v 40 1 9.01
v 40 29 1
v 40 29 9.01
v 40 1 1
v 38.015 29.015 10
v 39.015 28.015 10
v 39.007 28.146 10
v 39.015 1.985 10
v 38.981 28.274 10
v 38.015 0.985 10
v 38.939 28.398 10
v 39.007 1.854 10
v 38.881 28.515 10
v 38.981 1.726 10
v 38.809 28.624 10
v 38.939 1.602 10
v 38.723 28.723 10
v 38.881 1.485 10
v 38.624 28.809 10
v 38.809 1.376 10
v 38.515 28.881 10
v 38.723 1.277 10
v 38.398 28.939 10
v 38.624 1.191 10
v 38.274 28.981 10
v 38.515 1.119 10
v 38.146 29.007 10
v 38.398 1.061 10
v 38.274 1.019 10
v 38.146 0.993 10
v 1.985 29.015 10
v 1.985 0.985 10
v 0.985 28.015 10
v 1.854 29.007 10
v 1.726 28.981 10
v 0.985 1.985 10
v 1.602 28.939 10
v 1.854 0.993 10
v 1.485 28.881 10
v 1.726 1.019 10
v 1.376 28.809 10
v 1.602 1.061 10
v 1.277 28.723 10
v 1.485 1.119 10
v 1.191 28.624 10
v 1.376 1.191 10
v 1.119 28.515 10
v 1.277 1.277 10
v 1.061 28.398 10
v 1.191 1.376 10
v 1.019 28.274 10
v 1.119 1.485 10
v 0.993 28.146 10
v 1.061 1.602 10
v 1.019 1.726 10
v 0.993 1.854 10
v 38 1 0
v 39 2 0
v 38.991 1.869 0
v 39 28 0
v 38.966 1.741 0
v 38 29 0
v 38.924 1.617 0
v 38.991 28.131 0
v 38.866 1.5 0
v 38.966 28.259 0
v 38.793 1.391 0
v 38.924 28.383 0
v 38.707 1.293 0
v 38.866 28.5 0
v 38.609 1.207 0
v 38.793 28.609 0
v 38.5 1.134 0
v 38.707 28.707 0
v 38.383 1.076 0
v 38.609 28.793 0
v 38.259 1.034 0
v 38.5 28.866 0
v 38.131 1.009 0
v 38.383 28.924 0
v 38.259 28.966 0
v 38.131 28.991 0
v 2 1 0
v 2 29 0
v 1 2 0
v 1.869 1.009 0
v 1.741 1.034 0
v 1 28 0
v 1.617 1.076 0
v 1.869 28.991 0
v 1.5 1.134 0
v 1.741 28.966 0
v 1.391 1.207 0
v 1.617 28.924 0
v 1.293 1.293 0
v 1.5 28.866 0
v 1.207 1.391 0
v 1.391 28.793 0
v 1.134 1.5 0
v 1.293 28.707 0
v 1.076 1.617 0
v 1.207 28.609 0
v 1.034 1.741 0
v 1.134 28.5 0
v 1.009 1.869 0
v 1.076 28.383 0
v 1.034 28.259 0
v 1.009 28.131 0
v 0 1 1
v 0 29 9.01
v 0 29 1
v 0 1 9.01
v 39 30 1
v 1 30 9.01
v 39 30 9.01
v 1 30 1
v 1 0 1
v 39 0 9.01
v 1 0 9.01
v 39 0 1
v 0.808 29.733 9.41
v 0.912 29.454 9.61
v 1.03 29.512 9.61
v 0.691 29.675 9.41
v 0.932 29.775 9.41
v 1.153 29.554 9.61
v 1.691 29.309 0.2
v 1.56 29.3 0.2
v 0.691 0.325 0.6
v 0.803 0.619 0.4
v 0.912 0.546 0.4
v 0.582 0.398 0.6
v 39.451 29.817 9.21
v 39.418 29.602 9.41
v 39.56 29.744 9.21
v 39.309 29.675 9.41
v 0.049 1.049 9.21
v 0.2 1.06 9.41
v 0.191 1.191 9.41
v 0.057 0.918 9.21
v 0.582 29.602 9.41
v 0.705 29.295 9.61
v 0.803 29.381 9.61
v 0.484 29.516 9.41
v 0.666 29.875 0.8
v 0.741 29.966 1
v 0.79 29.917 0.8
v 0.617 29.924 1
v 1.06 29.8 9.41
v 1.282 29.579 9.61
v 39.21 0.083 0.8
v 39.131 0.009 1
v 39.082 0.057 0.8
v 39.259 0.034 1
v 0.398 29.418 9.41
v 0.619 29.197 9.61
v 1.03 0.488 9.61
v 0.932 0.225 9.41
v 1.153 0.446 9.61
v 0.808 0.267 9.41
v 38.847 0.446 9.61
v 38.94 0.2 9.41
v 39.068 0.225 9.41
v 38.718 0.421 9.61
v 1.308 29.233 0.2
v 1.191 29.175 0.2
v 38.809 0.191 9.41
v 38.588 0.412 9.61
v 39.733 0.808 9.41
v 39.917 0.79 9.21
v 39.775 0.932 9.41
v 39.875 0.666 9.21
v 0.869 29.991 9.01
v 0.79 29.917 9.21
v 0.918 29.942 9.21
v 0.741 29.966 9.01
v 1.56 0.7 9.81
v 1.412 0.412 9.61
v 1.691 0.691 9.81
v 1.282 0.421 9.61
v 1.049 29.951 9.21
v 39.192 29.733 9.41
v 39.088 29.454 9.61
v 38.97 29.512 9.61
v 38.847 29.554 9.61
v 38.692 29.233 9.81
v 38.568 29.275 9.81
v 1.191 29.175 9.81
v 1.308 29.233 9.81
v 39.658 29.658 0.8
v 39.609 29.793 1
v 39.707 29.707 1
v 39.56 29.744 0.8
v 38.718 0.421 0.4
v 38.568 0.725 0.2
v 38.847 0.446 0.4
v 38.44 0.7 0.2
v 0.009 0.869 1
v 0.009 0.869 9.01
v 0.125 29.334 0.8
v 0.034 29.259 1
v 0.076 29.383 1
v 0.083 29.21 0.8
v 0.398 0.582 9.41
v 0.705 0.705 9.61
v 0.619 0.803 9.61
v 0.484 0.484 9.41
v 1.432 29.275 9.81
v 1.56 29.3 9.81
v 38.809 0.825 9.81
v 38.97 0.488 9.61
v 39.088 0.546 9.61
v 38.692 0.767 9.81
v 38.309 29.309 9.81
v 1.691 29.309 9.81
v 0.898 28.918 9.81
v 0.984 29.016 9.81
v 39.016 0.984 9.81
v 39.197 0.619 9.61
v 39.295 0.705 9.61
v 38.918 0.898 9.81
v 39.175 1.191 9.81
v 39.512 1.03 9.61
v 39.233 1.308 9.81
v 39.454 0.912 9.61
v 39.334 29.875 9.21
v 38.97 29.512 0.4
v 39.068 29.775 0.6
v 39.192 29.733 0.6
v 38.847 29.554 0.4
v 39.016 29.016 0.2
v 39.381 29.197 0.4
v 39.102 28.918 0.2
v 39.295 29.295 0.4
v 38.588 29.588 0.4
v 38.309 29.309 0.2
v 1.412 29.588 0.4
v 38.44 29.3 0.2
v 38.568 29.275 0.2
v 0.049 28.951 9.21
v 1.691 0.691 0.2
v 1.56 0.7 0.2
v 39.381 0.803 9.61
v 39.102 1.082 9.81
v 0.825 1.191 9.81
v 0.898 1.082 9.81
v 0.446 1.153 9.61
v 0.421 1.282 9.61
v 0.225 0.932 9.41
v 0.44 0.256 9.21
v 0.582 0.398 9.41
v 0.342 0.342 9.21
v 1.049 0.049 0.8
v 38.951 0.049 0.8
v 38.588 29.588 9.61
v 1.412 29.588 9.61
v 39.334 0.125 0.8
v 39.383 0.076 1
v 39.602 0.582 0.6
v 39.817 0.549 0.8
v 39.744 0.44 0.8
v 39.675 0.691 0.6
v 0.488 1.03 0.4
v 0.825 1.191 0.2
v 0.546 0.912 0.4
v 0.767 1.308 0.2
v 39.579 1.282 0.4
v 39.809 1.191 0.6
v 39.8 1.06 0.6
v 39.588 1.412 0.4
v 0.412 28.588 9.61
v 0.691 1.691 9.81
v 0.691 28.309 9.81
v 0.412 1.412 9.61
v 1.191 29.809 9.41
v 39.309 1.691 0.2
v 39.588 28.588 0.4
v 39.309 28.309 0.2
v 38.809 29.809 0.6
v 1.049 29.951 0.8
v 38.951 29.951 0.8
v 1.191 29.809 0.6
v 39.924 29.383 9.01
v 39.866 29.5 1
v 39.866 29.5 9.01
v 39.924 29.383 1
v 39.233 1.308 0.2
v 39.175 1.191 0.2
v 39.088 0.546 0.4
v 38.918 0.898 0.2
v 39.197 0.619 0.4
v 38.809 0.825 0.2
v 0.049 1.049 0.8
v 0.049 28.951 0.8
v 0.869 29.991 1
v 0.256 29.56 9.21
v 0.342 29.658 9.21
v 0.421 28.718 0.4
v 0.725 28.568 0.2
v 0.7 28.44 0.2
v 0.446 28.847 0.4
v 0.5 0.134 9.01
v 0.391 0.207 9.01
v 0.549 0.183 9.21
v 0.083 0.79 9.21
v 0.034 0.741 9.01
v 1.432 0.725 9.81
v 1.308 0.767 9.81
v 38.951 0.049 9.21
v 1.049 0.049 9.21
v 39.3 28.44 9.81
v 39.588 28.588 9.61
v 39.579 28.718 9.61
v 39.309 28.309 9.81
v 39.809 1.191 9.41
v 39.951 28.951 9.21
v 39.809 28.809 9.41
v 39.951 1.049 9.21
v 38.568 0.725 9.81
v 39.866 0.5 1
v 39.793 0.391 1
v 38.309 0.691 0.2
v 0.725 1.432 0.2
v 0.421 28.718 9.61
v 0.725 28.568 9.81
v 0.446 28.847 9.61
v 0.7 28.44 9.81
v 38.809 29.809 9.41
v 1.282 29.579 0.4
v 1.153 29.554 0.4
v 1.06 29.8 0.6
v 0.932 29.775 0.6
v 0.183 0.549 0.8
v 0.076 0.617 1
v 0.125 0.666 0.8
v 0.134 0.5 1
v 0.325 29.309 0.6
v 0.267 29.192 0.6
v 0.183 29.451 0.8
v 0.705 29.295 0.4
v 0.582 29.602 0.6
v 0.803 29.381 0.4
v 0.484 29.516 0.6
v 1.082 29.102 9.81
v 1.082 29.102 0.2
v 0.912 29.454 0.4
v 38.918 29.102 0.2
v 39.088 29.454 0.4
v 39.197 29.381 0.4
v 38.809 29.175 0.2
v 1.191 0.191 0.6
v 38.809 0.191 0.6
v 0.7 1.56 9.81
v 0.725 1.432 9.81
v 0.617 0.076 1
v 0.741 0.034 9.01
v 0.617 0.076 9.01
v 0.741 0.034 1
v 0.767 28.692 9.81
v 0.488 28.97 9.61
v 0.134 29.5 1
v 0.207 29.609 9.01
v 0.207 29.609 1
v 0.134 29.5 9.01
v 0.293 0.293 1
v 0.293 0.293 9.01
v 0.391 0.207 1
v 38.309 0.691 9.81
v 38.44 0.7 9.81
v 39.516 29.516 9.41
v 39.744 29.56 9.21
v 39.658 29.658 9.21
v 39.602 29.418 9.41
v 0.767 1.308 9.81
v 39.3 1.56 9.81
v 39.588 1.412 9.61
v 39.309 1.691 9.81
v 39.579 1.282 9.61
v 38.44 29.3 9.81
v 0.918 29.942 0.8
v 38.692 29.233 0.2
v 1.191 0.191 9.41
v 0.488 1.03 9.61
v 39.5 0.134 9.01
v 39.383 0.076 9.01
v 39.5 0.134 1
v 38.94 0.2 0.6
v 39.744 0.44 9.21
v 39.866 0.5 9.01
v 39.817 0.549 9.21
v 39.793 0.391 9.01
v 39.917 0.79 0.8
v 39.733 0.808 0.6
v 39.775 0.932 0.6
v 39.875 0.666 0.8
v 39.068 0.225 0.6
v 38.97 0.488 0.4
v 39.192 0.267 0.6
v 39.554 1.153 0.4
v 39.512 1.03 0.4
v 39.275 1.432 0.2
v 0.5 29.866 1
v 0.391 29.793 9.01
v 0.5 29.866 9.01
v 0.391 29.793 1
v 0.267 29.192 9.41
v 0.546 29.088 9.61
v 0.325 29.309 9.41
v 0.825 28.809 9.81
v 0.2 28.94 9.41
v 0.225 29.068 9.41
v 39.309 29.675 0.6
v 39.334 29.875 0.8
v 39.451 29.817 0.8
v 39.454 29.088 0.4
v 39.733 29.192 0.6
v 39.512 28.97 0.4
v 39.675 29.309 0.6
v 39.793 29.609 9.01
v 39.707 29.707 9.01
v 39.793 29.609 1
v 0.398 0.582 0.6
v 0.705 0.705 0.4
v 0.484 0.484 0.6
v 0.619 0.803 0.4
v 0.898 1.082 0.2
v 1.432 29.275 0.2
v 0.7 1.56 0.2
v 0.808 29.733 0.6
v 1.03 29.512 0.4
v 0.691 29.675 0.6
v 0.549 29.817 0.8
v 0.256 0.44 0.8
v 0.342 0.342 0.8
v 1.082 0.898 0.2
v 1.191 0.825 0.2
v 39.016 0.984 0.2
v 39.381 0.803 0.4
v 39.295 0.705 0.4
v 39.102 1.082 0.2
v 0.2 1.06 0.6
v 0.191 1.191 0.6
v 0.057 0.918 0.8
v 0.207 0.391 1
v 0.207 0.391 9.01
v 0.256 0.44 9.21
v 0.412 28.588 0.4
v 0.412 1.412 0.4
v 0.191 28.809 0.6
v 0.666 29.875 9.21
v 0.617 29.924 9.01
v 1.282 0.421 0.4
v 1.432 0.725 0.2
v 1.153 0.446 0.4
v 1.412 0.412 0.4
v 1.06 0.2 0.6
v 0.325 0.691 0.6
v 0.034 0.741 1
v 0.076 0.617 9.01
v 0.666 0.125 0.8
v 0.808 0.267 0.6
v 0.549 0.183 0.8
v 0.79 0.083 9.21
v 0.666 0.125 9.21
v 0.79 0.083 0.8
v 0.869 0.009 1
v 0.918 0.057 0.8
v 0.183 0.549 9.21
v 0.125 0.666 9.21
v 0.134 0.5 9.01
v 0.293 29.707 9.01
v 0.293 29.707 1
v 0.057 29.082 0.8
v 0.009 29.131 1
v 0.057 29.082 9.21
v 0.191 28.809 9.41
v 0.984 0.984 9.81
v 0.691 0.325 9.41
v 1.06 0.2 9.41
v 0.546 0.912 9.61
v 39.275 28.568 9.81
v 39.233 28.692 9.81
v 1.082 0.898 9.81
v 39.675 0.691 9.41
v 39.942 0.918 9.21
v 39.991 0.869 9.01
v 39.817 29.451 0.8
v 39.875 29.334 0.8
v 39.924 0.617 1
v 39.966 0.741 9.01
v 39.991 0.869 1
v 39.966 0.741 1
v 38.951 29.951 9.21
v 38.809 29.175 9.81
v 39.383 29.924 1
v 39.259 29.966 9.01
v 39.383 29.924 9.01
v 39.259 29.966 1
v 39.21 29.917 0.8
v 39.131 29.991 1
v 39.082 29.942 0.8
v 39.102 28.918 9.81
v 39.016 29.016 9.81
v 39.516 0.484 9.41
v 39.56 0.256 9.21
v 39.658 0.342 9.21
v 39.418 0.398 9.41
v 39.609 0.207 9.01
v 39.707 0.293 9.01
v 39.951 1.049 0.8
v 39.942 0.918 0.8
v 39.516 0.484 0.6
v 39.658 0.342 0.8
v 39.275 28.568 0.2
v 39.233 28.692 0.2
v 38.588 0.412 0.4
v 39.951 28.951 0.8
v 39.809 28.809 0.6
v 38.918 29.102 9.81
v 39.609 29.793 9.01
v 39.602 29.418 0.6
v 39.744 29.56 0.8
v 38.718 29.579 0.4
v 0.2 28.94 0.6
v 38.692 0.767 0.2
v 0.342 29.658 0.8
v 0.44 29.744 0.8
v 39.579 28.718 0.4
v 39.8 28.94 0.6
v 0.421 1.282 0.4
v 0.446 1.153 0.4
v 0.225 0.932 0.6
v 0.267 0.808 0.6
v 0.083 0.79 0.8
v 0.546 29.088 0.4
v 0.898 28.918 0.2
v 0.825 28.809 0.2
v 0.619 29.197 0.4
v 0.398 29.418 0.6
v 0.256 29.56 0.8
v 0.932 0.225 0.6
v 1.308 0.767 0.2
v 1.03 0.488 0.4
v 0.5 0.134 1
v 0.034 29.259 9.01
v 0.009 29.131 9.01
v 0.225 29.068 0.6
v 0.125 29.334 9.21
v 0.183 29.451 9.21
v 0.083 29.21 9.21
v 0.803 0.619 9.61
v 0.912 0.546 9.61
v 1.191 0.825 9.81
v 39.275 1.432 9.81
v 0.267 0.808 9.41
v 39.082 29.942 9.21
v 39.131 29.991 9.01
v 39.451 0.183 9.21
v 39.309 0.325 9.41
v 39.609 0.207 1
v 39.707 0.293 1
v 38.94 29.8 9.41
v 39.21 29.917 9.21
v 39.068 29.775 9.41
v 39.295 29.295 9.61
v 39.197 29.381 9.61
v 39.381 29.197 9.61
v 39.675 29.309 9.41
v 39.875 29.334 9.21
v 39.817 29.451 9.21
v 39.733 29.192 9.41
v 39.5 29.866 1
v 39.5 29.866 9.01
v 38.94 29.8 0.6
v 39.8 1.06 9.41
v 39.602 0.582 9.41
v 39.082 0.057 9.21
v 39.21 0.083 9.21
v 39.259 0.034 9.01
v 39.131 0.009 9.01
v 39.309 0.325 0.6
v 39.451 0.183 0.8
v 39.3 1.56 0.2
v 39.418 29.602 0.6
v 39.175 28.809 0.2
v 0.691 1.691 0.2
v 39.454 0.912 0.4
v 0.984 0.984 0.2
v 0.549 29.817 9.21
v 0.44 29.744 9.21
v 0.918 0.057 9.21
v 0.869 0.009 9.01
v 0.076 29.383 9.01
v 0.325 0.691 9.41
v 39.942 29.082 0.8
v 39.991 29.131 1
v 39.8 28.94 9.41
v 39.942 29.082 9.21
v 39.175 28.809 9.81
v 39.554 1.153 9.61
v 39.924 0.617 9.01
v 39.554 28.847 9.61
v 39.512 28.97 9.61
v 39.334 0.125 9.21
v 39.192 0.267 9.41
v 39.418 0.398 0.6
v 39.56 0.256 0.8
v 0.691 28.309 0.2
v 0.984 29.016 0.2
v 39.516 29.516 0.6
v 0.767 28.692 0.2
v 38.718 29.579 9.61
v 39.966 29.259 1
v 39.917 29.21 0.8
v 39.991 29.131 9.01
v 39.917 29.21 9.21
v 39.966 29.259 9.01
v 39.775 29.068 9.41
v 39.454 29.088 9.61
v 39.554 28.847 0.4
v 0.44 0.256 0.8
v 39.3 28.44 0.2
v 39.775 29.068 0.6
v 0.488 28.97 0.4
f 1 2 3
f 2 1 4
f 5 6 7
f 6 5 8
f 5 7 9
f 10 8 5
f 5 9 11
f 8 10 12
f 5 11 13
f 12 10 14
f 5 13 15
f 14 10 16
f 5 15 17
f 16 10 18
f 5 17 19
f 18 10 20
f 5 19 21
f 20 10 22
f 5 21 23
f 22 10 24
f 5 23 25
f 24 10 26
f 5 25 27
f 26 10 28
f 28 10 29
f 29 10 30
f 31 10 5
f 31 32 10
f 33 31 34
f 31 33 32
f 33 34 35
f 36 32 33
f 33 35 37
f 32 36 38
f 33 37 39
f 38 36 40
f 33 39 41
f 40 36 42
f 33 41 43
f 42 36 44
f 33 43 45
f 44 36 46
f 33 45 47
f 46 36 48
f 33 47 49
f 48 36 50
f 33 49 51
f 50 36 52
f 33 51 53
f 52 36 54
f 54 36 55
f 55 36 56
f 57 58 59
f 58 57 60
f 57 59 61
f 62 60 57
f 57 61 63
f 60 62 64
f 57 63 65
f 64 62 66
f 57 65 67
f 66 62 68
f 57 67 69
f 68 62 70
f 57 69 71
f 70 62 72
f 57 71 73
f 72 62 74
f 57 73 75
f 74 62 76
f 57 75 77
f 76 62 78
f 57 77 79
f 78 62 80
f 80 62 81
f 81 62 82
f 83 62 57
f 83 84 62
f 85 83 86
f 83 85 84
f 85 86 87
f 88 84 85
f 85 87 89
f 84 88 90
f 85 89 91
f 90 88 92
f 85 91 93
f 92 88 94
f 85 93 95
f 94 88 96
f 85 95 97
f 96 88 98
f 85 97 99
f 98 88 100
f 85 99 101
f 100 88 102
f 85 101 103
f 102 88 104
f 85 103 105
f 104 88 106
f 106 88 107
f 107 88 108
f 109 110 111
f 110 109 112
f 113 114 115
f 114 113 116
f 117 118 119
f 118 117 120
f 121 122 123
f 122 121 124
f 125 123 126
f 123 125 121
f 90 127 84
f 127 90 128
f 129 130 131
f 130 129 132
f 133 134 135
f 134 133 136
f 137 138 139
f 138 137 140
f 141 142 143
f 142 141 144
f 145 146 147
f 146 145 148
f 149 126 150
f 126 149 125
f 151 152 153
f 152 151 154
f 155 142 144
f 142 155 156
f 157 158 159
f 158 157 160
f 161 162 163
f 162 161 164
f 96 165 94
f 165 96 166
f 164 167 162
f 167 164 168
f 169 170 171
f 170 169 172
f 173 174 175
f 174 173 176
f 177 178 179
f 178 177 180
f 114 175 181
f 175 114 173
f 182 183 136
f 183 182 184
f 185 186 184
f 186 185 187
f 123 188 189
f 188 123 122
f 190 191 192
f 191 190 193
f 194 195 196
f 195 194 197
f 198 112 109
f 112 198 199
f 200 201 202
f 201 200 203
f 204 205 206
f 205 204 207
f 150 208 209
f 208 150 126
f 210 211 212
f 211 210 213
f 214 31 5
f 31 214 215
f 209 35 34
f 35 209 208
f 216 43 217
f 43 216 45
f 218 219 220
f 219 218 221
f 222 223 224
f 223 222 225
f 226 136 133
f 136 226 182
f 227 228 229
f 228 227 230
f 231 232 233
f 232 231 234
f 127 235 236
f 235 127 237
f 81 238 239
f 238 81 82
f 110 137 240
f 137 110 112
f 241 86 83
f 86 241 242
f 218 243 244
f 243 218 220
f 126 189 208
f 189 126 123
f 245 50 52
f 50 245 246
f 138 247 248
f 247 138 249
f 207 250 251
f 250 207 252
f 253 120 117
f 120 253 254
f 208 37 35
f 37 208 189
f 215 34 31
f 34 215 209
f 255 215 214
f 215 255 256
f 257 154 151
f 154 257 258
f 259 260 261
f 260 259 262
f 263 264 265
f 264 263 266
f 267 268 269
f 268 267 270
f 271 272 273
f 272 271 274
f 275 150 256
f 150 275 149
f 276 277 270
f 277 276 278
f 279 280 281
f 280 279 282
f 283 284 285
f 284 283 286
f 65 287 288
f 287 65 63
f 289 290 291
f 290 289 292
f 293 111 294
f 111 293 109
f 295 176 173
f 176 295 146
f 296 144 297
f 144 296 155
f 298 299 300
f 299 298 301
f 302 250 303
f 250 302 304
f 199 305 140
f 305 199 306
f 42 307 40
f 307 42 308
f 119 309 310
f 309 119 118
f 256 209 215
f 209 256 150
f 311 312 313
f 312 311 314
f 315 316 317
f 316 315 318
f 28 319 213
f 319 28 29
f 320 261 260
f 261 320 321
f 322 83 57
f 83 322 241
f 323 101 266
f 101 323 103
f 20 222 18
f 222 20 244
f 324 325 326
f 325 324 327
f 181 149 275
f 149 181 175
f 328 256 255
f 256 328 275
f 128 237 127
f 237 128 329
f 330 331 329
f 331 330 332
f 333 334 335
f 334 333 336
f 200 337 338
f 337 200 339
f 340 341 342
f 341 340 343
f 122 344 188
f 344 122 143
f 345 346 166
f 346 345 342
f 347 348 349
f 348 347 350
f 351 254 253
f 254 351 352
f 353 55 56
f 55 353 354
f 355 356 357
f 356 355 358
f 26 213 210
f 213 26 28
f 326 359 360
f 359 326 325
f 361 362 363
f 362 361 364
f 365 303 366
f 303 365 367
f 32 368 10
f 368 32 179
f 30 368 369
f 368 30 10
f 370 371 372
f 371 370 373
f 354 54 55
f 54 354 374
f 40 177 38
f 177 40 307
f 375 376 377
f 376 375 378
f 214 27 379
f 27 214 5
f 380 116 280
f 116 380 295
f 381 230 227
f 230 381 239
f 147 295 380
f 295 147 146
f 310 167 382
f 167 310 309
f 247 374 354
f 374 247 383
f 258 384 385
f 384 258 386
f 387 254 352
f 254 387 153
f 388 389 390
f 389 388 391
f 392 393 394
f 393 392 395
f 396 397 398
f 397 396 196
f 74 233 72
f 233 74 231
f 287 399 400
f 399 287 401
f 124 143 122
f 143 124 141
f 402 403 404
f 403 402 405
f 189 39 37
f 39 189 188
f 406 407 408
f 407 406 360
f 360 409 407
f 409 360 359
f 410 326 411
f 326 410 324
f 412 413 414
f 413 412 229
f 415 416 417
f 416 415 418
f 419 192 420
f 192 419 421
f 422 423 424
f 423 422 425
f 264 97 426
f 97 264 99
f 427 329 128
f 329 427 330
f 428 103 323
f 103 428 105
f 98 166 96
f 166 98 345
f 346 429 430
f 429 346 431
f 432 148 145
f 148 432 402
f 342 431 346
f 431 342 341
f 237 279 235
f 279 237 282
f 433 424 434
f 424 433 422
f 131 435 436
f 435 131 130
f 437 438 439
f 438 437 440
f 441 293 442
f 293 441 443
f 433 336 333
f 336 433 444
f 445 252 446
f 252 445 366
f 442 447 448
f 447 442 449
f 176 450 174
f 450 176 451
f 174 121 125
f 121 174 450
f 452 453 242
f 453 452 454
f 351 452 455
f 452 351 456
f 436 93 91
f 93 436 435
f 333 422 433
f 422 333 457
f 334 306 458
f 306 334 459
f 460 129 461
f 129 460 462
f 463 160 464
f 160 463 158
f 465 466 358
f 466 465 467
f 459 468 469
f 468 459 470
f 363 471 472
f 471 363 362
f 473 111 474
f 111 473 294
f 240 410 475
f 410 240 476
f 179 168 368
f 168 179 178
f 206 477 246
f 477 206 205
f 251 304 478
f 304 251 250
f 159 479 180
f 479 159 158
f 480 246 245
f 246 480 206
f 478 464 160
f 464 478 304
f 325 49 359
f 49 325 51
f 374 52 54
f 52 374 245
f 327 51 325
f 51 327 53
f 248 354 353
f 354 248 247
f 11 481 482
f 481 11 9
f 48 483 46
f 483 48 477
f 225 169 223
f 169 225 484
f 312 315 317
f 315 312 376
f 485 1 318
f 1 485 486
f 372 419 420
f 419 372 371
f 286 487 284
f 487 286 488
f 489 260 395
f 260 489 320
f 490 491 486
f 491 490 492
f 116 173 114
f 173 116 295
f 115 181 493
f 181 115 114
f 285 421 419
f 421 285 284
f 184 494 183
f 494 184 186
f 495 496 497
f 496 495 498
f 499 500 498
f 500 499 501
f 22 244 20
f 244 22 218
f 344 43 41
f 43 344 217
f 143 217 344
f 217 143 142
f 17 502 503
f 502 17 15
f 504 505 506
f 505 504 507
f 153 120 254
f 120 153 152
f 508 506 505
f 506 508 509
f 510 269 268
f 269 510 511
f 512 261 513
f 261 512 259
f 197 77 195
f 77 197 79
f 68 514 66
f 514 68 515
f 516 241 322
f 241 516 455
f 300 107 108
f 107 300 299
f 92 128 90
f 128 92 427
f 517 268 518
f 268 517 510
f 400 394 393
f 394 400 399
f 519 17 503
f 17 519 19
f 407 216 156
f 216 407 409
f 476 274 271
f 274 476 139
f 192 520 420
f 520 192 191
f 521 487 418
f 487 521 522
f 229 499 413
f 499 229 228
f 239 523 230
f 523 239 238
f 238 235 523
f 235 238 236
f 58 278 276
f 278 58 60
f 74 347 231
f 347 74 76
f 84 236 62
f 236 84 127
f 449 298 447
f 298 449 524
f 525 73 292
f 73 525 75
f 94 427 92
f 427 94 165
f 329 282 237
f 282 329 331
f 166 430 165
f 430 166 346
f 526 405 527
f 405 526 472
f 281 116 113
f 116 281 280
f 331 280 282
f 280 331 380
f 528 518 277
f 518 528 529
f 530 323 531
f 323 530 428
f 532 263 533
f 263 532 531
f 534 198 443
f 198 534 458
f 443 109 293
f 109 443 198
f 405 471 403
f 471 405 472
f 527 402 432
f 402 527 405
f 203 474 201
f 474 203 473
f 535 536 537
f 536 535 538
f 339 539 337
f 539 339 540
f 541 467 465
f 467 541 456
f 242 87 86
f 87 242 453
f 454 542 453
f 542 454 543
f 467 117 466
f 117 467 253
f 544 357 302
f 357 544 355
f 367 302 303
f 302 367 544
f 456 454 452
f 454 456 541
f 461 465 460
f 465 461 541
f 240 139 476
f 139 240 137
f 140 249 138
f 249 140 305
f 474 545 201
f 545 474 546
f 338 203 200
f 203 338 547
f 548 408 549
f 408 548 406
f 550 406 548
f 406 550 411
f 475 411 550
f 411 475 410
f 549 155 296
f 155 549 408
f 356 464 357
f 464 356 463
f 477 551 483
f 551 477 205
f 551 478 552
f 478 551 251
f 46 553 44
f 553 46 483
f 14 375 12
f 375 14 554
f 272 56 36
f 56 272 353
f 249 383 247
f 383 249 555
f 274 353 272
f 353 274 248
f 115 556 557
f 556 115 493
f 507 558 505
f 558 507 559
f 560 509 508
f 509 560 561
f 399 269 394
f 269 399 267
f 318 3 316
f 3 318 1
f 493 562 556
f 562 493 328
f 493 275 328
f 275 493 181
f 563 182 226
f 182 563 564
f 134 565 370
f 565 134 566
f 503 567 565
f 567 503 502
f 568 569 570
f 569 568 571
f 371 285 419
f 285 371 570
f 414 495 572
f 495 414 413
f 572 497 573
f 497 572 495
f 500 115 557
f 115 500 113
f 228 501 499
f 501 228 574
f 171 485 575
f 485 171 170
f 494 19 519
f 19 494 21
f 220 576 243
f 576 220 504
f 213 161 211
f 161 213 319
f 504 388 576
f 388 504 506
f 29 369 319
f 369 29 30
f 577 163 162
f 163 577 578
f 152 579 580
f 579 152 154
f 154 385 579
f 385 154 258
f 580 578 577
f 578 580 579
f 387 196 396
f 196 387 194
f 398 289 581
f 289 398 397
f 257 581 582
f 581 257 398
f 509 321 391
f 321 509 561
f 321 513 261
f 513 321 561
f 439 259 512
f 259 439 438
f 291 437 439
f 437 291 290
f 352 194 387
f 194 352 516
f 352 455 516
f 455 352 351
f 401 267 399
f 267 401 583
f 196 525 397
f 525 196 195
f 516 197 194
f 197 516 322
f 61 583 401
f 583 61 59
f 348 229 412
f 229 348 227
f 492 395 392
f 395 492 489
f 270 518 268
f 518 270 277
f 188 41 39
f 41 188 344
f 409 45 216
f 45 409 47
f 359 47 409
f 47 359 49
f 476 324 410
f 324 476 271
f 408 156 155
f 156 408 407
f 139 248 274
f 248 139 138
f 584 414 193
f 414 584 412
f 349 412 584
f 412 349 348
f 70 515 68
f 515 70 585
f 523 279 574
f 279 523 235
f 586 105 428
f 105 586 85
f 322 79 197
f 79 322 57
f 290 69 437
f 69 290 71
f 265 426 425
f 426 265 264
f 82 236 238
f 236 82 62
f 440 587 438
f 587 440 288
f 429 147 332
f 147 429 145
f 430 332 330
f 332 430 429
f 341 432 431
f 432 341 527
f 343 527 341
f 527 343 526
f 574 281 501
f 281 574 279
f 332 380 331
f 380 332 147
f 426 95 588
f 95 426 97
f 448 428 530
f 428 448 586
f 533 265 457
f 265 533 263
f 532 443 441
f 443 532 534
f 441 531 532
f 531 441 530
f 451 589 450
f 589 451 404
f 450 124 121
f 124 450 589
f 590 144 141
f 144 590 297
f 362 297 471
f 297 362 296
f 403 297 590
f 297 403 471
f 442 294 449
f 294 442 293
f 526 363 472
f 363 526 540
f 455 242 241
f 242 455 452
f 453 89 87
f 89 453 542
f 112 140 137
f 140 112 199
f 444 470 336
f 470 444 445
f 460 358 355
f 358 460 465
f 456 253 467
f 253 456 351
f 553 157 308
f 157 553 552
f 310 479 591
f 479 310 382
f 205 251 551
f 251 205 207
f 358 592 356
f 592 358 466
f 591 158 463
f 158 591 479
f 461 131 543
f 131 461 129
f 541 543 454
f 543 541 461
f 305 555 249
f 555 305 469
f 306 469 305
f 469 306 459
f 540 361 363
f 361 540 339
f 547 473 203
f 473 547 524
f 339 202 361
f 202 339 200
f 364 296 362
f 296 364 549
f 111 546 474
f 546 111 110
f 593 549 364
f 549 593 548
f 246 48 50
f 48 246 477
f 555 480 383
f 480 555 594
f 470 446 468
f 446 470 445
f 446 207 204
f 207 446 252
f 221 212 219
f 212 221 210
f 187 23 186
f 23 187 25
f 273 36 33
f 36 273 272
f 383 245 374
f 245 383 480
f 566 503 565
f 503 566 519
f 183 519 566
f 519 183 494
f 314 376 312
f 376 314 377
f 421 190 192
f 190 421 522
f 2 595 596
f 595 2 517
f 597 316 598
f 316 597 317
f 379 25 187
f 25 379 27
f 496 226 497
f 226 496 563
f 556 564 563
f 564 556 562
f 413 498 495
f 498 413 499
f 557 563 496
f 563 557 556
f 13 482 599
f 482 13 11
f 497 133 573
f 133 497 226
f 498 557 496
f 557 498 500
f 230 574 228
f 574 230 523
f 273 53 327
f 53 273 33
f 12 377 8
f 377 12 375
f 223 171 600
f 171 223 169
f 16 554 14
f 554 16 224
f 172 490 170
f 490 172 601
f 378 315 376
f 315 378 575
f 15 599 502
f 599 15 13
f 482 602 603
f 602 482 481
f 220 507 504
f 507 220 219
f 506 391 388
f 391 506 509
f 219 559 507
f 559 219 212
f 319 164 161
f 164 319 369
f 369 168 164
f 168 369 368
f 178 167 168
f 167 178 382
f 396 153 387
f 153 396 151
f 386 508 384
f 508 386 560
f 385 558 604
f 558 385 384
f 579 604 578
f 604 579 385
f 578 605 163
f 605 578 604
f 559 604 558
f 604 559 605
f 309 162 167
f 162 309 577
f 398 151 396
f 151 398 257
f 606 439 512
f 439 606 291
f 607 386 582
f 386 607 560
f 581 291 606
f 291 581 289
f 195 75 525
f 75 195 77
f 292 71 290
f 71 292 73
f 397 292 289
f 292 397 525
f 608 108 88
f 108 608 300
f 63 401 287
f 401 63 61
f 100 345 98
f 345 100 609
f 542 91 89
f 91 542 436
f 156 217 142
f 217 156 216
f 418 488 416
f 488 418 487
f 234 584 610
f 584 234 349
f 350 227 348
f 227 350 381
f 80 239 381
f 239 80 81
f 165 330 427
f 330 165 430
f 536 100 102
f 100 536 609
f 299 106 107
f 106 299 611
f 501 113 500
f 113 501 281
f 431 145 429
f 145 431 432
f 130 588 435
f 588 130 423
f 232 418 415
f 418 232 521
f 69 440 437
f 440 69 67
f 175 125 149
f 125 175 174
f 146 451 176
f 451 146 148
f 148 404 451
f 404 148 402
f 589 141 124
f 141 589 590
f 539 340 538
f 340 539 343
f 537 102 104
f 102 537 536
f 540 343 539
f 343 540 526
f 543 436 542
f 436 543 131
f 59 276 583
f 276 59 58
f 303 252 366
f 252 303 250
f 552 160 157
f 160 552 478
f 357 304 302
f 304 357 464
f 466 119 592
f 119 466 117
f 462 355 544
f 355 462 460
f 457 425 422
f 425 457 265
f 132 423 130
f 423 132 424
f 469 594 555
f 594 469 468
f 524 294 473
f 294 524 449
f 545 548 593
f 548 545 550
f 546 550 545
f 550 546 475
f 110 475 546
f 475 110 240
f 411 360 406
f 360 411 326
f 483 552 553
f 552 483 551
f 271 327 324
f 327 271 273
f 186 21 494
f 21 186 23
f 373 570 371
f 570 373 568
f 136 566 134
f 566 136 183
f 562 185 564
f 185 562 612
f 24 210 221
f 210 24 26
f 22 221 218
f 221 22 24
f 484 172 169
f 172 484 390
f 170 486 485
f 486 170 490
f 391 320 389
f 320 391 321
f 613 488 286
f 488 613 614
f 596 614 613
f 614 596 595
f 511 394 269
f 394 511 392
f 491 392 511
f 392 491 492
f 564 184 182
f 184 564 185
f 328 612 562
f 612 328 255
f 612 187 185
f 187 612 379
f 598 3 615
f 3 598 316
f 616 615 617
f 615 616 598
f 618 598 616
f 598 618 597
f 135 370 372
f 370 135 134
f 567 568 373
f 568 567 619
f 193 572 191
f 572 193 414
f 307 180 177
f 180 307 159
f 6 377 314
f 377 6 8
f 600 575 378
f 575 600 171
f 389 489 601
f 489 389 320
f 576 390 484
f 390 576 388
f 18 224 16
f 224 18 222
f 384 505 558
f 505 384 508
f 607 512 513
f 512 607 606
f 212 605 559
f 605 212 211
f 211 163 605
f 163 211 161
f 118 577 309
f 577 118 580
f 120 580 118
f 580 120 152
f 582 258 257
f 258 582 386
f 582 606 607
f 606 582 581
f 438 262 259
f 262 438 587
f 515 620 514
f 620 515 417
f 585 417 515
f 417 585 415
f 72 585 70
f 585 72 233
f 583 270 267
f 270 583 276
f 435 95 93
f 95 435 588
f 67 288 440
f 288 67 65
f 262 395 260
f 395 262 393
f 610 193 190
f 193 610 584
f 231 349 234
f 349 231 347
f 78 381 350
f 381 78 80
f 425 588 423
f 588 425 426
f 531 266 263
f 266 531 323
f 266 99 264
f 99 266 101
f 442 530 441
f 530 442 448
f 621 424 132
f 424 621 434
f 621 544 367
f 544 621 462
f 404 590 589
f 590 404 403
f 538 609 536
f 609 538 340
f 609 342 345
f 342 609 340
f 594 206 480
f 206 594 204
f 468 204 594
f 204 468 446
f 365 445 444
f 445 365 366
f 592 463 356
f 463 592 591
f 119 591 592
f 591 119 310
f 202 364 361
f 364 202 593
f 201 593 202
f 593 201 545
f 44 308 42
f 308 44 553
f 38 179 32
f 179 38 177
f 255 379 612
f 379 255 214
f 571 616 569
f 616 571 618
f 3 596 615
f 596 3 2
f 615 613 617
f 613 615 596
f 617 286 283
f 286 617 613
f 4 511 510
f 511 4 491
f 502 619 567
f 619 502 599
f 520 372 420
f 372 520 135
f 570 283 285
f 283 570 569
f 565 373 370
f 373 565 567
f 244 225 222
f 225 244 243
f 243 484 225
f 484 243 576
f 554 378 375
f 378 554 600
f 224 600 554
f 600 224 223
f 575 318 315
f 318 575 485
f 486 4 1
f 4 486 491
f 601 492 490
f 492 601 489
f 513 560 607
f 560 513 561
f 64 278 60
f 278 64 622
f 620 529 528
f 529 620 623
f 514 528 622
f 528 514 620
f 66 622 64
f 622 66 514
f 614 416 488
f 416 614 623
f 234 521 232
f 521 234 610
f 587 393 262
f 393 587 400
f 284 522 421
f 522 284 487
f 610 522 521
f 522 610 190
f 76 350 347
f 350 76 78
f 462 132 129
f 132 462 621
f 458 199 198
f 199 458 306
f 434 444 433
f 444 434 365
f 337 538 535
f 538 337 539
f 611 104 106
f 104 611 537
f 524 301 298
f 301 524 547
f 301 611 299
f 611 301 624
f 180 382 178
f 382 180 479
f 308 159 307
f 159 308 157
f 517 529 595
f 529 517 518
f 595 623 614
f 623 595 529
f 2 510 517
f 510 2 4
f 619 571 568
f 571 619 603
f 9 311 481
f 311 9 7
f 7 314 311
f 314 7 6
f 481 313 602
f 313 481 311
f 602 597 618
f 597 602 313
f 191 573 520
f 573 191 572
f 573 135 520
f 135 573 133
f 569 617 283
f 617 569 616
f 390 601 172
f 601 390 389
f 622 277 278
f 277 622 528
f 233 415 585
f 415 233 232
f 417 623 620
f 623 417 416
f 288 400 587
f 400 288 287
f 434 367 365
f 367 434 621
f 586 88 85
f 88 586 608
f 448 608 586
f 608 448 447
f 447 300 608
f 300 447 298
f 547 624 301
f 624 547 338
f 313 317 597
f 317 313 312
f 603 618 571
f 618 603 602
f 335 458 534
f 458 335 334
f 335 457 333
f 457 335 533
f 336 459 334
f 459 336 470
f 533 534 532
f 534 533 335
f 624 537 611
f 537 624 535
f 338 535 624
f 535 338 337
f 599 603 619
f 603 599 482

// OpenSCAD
// units=mm — generated by scad_emitter.py
// part=unnamed
$fn = 48;

intersection() { intersection() { cube([40, 30, 10]); hull() { translate([2, 2, 0]) linear_extrude(height=0.01) offset(r=1) square([36, 26]); translate([1.691, 1.691, 0.2]) linear_extrude(height=0.01) offset(r=1) square([36.618, 26.618]); translate([1.4122, 1.4122, 0.4]) linear_extrude(height=0.01) offset(r=1) square([37.1756, 27.1756]); translate([1.191, 1.191, 0.6]) linear_extrude(height=0.01) offset(r=1) square([37.618, 27.618]); translate([1.0489, 1.0489, 0.8]) linear_extrude(height=0.01) offset(r=1) square([37.9021, 27.9021]); translate([1, 1, 1]) linear_extrude(height=0.01) offset(r=1) square([38, 28]); translate([2, 2, 10]) linear_extrude(height=0.01) offset(r=1) square([36, 26]); translate([1.691, 1.691, 9.8]) linear_extrude(height=0.01) offset(r=1) square([36.618, 26.618]); translate([1.4122, 1.4122, 9.6]) linear_extrude(height=0.01) offset(r=1) square([37.1756, 27.1756]); translate([1.191, 1.191, 9.4]) linear_extrude(height=0.01) offset(r=1) square([37.618, 27.618]); translate([1.0489, 1.0489, 9.2]) linear_extrude(height=0.01) offset(r=1) square([37.9021, 27.9021]); translate([1, 1, 9]) linear_extrude(height=0.01) offset(r=1) square([38, 28]); } } hull() { translate([0, 0, 0]) linear_extrude(height=0.01) offset(r=0) square([40, 30]); translate([0.5, 0.5, 10]) linear_extrude(height=0.01) offset(r=0) square([39, 29]); translate([0, 0, 9.5]) linear_extrude(height=0.01) offset(r=0) square([40, 30]); } }
